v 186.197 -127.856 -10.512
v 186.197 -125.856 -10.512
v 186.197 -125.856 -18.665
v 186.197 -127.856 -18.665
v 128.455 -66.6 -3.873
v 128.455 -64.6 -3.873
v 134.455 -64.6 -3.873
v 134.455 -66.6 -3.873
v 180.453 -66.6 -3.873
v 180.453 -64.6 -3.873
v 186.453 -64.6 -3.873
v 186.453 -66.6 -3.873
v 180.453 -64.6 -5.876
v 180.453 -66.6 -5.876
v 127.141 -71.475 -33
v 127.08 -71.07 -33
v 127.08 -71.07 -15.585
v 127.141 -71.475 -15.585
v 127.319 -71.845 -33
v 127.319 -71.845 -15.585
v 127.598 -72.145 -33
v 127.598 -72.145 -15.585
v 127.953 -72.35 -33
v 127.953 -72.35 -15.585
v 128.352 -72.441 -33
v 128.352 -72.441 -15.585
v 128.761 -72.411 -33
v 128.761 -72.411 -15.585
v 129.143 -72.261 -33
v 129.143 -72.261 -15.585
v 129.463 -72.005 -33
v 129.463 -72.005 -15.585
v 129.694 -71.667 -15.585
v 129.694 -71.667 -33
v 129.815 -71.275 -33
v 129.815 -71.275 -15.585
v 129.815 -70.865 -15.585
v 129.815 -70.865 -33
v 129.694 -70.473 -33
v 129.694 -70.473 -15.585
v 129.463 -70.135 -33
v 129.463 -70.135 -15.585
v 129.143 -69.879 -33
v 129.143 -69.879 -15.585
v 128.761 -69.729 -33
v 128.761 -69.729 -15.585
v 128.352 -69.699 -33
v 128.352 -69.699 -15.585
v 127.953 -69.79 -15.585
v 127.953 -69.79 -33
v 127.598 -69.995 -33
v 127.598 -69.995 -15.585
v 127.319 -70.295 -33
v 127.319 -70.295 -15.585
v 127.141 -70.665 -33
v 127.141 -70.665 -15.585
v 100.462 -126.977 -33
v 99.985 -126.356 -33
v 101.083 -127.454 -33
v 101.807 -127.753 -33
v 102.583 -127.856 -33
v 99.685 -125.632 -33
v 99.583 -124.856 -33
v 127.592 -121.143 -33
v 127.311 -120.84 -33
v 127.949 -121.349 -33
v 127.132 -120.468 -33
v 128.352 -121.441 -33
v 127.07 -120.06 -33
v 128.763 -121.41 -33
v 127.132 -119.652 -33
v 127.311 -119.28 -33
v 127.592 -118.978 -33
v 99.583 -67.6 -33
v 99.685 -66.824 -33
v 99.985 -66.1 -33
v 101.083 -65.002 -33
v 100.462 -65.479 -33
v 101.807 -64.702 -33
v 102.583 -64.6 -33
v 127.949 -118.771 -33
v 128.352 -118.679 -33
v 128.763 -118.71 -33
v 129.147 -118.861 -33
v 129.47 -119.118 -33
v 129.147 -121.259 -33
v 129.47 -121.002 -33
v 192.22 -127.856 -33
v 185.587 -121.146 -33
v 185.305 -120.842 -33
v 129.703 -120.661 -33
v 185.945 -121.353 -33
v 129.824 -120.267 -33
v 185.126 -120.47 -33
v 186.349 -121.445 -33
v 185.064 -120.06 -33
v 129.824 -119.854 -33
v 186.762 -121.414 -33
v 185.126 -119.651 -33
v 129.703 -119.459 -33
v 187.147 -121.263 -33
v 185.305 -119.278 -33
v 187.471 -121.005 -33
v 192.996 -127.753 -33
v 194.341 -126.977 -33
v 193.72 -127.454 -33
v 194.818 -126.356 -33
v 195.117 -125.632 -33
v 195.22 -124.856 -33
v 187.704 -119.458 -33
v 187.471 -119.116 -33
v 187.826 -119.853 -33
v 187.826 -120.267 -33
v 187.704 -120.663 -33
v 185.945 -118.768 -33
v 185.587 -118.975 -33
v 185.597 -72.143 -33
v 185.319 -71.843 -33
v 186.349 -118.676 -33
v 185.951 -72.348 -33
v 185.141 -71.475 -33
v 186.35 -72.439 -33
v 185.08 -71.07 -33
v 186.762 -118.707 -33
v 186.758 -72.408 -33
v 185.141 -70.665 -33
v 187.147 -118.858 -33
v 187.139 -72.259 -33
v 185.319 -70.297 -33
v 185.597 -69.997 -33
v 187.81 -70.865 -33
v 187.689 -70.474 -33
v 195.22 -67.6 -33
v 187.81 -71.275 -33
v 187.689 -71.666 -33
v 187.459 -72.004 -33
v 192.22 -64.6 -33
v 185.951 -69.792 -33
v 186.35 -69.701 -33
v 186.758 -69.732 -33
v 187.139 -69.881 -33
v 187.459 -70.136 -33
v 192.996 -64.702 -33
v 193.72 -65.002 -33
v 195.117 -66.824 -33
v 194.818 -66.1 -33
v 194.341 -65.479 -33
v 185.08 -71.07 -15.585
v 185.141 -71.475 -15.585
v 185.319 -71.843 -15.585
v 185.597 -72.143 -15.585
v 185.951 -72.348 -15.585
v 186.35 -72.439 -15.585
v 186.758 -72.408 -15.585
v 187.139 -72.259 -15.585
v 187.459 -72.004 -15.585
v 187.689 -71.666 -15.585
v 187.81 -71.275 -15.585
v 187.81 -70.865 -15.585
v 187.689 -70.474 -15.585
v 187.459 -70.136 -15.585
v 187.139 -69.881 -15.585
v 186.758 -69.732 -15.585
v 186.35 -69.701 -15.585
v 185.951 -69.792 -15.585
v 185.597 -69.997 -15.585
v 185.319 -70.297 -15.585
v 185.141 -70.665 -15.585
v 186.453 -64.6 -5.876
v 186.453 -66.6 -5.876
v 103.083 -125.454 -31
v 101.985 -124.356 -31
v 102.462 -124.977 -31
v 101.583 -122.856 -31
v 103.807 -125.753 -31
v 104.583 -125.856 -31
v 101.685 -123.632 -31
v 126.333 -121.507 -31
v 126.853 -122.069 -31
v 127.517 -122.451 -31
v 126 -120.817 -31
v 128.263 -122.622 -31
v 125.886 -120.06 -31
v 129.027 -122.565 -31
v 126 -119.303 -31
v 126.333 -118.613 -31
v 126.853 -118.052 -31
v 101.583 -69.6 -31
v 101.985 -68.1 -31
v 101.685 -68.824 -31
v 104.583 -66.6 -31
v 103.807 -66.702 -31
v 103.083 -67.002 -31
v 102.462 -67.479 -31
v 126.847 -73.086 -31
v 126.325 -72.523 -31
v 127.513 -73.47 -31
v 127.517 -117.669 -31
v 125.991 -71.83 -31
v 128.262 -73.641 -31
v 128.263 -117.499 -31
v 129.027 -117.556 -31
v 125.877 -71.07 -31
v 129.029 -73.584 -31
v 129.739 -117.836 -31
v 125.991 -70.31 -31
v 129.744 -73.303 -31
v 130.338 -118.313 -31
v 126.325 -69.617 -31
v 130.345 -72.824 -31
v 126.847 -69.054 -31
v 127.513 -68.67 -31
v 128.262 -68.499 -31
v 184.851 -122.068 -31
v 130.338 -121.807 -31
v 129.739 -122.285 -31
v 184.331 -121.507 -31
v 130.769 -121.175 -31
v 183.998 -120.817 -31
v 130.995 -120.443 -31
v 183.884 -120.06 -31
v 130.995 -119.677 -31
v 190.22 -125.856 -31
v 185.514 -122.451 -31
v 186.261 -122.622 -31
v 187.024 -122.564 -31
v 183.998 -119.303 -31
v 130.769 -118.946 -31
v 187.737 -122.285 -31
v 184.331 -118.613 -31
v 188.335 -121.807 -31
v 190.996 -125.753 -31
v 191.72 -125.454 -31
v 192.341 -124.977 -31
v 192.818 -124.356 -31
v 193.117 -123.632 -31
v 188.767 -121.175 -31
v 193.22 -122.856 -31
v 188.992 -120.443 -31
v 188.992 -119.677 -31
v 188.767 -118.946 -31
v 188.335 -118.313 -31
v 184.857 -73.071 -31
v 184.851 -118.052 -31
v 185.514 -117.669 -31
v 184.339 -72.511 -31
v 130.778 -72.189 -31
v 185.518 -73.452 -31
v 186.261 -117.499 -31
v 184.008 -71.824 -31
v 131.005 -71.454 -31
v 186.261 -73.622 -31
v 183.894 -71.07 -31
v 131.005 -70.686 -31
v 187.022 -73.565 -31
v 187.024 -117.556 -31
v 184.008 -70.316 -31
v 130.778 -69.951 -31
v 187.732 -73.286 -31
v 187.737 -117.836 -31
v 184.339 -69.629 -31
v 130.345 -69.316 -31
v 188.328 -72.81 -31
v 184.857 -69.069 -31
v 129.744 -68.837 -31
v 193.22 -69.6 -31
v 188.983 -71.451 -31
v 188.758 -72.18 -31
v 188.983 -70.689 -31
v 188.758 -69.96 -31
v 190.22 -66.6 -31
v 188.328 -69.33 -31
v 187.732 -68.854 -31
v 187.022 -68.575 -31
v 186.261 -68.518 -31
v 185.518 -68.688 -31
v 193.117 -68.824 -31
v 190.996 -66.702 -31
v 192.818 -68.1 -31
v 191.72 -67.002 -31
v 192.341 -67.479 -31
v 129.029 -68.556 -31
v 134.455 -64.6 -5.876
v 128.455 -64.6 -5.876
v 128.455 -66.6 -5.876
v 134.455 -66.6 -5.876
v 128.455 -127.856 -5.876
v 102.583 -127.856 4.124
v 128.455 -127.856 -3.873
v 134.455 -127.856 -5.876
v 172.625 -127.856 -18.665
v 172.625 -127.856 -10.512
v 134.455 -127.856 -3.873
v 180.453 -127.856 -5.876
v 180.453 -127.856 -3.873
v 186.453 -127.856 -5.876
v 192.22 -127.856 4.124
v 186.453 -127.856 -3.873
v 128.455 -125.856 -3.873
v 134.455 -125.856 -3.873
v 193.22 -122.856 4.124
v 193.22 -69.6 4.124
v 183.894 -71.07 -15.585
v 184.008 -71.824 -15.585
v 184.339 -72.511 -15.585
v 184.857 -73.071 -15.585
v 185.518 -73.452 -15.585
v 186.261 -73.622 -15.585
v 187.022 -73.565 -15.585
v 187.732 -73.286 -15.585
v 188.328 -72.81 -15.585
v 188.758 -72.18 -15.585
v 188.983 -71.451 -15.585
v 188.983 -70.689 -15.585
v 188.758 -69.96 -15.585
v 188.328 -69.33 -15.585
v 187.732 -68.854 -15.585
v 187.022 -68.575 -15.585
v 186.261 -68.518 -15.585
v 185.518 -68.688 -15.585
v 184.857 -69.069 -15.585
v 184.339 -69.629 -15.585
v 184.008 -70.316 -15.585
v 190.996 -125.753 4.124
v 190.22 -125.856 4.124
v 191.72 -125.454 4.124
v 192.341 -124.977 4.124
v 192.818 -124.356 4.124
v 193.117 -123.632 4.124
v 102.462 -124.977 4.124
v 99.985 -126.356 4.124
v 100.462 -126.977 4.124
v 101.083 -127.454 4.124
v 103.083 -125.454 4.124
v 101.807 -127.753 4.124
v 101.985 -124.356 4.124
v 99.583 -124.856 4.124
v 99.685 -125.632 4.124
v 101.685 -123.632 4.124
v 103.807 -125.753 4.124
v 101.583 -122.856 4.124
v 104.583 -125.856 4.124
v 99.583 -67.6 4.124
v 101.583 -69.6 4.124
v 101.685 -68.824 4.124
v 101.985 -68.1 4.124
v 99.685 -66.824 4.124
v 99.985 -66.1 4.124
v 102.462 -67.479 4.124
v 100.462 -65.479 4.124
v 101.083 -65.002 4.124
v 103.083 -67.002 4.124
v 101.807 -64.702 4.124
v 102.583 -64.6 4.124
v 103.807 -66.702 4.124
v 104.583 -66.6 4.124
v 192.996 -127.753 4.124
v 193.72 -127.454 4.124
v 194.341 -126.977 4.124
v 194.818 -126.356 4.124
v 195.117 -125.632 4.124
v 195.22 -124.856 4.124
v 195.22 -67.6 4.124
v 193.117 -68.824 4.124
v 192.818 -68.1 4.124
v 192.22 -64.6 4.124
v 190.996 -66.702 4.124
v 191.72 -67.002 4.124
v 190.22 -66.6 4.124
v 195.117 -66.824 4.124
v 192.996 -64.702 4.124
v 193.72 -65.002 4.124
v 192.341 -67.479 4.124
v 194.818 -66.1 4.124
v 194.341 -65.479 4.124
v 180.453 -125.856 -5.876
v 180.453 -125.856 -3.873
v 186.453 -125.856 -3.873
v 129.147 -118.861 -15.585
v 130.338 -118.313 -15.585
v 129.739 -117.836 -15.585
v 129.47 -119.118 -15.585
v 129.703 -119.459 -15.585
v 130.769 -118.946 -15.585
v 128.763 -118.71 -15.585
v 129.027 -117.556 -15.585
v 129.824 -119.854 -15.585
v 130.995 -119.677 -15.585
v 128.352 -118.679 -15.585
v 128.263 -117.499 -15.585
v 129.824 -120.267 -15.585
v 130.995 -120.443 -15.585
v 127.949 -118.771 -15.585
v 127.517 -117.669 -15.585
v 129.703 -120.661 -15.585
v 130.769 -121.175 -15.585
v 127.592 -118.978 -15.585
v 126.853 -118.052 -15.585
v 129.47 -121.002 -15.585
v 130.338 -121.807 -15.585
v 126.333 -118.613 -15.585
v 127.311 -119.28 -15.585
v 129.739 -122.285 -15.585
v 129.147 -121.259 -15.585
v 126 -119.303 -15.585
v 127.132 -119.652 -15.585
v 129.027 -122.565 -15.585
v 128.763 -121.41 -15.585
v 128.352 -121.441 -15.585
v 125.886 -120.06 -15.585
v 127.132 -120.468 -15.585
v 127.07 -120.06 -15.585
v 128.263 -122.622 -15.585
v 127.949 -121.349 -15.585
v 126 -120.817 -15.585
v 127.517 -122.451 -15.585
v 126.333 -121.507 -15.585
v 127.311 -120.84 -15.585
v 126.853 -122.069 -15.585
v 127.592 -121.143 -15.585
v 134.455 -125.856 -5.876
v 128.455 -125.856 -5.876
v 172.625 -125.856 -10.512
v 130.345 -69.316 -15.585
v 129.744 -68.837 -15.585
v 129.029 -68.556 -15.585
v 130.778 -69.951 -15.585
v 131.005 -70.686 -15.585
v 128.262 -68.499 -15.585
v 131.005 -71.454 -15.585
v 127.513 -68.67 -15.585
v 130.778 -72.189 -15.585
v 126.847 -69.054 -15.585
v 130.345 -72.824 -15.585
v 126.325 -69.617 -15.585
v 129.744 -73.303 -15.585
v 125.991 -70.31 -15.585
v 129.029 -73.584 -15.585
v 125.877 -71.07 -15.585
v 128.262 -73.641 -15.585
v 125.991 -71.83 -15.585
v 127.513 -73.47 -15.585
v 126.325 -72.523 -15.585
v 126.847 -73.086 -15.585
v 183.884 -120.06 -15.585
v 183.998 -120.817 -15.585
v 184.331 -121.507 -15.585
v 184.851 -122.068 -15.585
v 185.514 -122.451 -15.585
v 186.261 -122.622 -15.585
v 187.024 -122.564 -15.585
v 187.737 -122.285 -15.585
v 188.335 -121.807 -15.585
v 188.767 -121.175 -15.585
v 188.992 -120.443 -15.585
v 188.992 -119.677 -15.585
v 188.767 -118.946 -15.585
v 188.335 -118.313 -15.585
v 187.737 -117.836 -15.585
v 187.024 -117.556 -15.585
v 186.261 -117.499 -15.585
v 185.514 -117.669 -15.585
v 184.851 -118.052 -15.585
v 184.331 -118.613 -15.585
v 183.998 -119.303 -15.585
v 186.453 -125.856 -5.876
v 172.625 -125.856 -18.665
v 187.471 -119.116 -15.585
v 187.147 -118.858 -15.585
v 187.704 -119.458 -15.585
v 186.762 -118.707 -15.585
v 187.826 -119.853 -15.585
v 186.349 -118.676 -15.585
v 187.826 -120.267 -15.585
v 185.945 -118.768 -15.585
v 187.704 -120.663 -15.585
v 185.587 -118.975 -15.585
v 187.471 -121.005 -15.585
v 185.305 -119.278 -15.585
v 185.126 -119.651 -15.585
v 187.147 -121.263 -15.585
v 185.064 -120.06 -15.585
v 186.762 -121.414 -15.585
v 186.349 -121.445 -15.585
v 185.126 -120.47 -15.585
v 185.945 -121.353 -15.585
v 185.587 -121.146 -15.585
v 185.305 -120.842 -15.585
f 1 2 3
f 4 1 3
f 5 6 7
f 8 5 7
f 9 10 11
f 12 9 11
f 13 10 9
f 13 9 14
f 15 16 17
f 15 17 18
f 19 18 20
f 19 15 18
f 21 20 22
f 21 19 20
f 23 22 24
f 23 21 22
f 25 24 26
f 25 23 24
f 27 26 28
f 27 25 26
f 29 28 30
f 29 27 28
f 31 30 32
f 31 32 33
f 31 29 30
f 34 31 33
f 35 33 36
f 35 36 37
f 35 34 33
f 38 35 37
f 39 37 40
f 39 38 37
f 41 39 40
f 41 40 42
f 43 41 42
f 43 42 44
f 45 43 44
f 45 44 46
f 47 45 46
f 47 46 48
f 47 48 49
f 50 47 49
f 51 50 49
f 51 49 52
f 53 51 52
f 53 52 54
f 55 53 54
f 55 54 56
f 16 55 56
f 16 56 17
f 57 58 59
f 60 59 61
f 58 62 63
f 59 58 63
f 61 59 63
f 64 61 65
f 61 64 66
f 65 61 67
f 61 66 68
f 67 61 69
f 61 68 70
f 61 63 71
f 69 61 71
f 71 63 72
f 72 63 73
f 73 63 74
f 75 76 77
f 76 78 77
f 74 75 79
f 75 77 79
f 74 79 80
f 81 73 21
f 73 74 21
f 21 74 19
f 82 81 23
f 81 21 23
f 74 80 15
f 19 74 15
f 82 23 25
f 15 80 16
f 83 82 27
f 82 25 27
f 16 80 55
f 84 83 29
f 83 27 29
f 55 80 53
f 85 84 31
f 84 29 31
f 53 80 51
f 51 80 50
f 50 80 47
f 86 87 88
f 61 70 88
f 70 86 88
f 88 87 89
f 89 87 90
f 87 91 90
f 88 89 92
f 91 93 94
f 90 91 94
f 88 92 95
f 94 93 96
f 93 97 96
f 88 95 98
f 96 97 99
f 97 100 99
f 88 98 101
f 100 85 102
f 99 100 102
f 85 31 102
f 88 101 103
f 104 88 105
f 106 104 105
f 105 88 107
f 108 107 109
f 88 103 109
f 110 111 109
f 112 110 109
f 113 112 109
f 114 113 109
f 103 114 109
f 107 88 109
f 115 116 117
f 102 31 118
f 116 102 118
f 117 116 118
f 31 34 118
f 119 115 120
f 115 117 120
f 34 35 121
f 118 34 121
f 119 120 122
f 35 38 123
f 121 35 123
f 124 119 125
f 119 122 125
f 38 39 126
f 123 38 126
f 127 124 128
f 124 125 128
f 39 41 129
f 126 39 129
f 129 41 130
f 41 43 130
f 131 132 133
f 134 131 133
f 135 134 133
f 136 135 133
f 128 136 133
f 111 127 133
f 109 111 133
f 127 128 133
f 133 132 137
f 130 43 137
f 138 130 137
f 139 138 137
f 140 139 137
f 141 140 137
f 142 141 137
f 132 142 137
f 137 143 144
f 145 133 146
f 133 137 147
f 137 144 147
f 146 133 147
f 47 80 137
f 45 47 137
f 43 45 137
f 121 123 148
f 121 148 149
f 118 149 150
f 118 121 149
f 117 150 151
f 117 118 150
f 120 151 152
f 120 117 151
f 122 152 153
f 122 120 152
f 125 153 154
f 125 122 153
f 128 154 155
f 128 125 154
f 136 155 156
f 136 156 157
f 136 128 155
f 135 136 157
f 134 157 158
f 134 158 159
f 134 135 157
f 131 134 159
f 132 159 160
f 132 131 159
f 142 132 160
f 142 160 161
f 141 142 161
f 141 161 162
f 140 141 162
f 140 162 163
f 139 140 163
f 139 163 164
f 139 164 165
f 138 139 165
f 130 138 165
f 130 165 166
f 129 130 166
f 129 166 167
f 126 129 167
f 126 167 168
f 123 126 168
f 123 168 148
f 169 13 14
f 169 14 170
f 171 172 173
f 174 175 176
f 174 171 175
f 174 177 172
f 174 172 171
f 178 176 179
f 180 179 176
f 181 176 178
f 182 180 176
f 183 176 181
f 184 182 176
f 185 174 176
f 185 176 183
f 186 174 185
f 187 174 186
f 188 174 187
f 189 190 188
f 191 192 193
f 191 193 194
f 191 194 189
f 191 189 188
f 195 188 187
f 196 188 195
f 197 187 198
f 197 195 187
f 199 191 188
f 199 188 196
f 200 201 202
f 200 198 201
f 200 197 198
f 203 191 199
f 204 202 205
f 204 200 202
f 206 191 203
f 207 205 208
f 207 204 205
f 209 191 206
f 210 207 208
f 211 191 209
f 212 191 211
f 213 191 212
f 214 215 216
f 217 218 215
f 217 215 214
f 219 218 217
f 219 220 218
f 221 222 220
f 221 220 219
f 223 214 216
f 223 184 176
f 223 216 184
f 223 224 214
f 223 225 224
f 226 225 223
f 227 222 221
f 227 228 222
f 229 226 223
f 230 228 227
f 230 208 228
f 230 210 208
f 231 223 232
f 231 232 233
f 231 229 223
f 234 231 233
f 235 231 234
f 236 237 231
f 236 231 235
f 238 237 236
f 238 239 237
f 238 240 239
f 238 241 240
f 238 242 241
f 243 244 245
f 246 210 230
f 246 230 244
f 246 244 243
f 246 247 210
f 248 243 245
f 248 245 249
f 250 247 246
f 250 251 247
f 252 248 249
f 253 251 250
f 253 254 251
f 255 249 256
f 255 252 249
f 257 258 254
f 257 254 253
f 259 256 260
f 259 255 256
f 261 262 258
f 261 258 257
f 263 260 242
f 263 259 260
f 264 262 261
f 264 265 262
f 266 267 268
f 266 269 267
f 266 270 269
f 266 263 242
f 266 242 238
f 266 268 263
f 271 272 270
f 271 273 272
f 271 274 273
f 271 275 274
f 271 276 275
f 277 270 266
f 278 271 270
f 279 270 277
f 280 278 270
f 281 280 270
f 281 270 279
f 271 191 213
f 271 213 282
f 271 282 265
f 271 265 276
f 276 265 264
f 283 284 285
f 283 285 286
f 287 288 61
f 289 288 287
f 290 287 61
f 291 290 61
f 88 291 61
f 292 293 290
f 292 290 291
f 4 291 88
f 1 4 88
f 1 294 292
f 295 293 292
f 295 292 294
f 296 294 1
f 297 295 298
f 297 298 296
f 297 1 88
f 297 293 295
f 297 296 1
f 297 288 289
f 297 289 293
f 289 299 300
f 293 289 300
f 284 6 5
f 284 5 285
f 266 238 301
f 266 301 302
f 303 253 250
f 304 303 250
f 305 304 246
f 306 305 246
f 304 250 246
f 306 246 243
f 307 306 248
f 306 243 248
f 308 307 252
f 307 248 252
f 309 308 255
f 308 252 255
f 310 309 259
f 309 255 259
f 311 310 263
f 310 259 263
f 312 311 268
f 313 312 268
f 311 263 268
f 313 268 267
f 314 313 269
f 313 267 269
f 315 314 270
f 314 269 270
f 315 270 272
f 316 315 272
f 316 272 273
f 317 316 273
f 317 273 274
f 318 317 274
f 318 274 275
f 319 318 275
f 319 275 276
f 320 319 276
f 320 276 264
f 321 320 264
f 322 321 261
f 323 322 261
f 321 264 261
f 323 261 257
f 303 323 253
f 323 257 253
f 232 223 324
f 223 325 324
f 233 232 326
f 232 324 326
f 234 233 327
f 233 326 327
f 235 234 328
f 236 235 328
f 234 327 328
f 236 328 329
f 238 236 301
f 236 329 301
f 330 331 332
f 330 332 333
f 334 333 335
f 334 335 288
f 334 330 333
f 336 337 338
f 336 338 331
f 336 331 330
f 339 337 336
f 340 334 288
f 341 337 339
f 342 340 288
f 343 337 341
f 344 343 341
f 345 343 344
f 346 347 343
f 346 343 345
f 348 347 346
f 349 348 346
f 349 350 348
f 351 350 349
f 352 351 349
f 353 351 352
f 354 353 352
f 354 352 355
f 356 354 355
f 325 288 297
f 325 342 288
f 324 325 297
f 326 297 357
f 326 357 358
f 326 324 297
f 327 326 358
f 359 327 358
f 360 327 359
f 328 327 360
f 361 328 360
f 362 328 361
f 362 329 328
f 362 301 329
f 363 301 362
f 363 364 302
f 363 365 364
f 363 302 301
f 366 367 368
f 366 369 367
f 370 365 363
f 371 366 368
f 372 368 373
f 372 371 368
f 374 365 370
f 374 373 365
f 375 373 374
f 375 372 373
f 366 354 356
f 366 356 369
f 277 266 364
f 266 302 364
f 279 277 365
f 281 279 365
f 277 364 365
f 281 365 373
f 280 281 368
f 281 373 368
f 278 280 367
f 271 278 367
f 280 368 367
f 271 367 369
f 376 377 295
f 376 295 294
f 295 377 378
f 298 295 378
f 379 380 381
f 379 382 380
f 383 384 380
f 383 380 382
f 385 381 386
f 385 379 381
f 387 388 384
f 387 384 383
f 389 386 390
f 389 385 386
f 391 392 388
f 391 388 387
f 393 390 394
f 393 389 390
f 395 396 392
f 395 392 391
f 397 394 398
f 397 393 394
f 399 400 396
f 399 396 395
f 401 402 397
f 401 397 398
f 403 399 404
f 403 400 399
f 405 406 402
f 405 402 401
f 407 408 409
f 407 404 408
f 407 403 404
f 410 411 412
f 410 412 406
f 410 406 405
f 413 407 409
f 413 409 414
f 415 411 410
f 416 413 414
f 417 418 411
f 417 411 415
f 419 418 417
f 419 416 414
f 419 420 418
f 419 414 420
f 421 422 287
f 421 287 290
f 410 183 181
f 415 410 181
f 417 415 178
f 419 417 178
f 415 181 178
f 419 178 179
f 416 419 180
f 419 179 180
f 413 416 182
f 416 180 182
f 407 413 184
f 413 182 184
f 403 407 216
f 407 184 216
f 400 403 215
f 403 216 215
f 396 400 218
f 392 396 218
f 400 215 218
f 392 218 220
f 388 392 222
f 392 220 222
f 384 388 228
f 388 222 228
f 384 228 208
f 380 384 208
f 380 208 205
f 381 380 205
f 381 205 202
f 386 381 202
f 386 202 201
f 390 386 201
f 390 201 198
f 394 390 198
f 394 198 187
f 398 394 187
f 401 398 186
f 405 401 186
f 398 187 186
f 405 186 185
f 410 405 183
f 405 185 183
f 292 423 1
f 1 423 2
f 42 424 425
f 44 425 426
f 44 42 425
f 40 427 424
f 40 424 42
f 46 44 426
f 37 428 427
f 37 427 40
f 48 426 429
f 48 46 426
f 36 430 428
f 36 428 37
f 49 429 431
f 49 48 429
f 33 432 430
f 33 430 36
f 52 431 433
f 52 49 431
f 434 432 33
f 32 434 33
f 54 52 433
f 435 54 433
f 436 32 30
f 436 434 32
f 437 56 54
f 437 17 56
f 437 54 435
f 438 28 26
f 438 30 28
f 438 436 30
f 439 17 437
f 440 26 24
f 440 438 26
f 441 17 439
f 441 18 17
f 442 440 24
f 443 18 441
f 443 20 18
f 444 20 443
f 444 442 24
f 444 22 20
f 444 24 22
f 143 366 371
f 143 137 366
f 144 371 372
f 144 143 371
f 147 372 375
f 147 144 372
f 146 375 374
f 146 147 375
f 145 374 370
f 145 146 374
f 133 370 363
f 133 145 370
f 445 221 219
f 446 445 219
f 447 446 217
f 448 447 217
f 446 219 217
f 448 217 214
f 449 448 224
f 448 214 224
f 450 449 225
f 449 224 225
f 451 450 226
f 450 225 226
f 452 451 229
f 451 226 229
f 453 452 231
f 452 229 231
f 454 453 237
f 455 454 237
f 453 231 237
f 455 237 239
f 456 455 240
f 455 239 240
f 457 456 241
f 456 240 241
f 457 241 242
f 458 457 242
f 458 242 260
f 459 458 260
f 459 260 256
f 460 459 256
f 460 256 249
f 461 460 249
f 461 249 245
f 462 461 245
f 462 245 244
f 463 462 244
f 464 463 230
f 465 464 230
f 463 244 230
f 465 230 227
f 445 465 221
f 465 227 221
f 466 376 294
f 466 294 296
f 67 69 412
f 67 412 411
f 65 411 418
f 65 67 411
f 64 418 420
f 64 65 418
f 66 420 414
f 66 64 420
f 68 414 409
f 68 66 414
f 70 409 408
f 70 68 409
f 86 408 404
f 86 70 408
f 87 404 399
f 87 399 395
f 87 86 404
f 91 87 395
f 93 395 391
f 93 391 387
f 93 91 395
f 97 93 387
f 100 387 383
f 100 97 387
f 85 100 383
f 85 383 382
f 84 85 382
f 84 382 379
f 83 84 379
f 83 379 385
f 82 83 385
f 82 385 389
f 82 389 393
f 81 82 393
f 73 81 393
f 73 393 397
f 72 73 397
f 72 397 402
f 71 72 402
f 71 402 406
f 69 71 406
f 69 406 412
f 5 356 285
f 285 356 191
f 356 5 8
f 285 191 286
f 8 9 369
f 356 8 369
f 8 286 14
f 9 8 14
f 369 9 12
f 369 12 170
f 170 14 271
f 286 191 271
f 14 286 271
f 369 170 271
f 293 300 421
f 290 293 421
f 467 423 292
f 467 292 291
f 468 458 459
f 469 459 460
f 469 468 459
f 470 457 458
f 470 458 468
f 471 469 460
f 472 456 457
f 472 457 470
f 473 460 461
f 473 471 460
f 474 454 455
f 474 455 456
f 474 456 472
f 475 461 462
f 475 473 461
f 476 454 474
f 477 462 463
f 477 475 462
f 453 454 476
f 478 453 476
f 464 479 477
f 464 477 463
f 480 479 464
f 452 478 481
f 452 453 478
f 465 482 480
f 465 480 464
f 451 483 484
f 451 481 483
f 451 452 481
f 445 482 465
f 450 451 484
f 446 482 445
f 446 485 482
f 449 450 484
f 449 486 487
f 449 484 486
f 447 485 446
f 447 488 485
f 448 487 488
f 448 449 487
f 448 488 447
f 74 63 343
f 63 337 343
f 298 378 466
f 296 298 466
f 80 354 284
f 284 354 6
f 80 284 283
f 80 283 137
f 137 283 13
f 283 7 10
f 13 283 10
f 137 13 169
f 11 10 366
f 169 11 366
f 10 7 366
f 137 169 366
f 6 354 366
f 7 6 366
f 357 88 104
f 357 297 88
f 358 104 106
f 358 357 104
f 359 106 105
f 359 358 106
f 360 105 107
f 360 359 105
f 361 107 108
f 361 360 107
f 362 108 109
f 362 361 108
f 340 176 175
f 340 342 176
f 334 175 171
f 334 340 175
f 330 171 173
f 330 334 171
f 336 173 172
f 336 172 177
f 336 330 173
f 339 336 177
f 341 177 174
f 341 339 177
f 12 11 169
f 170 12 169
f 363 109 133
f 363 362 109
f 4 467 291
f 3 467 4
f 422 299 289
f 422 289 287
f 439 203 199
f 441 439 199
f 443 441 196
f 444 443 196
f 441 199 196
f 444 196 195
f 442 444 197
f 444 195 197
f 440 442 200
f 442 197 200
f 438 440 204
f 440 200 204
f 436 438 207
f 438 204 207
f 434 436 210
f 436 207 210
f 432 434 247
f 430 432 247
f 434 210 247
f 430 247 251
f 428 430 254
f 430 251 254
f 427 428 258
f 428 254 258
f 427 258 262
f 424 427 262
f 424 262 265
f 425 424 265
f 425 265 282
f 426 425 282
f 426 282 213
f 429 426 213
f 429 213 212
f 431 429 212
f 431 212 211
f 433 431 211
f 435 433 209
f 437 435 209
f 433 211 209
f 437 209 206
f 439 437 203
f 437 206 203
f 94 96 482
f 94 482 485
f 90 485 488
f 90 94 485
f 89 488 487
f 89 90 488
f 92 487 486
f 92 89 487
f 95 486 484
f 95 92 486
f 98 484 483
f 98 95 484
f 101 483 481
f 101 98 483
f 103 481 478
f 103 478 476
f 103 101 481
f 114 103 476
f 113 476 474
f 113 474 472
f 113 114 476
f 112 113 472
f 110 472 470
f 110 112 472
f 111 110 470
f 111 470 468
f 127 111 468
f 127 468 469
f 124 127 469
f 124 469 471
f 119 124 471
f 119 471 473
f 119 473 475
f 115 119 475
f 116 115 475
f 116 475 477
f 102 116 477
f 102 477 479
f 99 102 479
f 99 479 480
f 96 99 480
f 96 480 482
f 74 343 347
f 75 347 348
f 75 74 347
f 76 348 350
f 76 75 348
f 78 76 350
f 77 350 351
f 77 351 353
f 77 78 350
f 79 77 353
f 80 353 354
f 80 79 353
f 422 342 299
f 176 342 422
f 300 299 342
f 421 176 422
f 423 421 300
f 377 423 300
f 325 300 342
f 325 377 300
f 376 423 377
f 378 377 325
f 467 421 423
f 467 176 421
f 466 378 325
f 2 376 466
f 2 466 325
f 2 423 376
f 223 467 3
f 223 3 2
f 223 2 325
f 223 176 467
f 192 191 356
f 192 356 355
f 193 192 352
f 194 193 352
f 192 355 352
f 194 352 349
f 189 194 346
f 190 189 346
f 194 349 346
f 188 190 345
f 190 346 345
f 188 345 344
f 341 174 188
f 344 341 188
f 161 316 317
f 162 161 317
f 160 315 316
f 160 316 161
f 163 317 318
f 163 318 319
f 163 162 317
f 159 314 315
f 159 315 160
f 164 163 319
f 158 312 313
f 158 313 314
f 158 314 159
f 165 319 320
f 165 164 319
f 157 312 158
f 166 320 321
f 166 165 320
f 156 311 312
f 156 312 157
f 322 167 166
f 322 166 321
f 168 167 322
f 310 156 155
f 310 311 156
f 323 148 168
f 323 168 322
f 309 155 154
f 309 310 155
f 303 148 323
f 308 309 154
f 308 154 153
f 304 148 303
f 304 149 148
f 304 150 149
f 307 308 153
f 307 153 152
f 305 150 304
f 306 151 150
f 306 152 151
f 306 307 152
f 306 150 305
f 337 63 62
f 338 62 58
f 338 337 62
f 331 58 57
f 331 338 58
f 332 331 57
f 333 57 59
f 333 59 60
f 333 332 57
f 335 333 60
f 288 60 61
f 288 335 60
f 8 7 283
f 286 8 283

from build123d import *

# Parameters (mm, degrees)
PERIMETER_DEPTH      = 4.124453
PERIMETER_DEPTH_BACK = 31
SKETCH2_W            = 95.636537696
SKETCH2_H            = 63.255720718
SKETCH2_W_2          = 91.636537696
SKETCH2_H_2          = 59.255720718
USB_HOLE_START       = -66.6
SKETCH4_W            = 13.571838798
SKETCH4_H            = 8.15289322
USB_HOLE_DEPTH       = 81
BOTTOM_START         = -31
SKETCH2_12_W         = 95.636537696
SKETCH2_12_H         = 63.255720718
BOTTOM_DEPTH         = 2
SKETCH4_6_W          = 6
SKETCH4_6_H          = 2.002355377
LOCKING_HOLE_DEPTH   = 152
FILLET1_R            = 3
STRAWS_START         = -31
SKETCH2_14_R         = 2.578463196
SKETCH2_14_R_2       = 1.375
SKETCH2_14_R_3       = 2.558752615
SKETCH2_14_R_4       = 1.372691975
SKETCH2_14_R_5       = 2.568645486
SKETCH2_14_R_6       = 1.384737696
SKETCH2_14_R_7       = 2.568443666
SKETCH2_14_R_8       = 1.388555099
STRAWS_DEPTH         = 15.415068015
CUT_EXTRUDE3_START   = -68
SKETCH2_16_R         = 1.375
SKETCH2_16_R_2       = 1.388555099
SKETCH2_16_R_3       = 1.384737696
SKETCH2_16_R_4       = 1.372691975
CUT_EXTRUDE3_DEPTH   = 68


with BuildPart() as part:
    # Sketch2 → Perimeter (new, two sides: drawn at the far end of the back side and taken through both)
    with BuildSketch(Plane.XY.offset(-PERIMETER_DEPTH_BACK)):
        with Locations((147.401306837, -96.227860359)):
            Rectangle(SKETCH2_W, SKETCH2_H)
        with Locations((147.401306837, -96.227860359)):
            Rectangle(SKETCH2_W_2, SKETCH2_H_2, mode=Mode.SUBTRACT)
    extrude(amount=PERIMETER_DEPTH + PERIMETER_DEPTH_BACK)

    # Sketch4 → USB_Hole (cut)
    with BuildSketch(Plane(origin=(0, 0, 0), x_dir=(1, 0, 0), z_dir=(0, 1, 0)).offset(USB_HOLE_START)):
        with Locations((179.410729964, 14.588485375)):
            Rectangle(SKETCH4_W, SKETCH4_H)
    extrude(amount=-USB_HOLE_DEPTH, mode=Mode.SUBTRACT)

    # Sketch2<12> → Bottom (add)
    with BuildSketch(Plane.XY.offset(BOTTOM_START)):
        with Locations((147.401306837, -96.227860359)):
            Rectangle(SKETCH2_12_W, SKETCH2_12_H)
    extrude(amount=-BOTTOM_DEPTH)

    # Sketch4<6> → Locking_Hole (cut)
    with BuildSketch(Plane(origin=(0, 0, 0), x_dir=(1, 0, 0), z_dir=(0, 1, 0))):
        with Locations((131.455, 4.874369651)):
            Rectangle(SKETCH4_6_W, SKETCH4_6_H)
        with Locations((183.452691975, 4.874369651)):
            Rectangle(SKETCH4_6_W, SKETCH4_6_H)
    extrude(amount=-LOCKING_HOLE_DEPTH, mode=Mode.SUBTRACT)

    # Fillet1
    fillet1_edges = [part.edges().sort_by_distance(p)[0] for p in [
        (101.583037989, -125.855720718, -13.4377735),
        (101.583037989, -66.6, -13.4377735),
        (193.219575685, -66.6, -13.4377735),
        (195.219575685, -64.6, -14.4377735),
        (193.219575685, -125.855720718, -13.4377735),
        (195.219575685, -127.855720718, -14.4377735),
        (99.583037989, -64.6, -14.4377735),
        (99.583037989, -127.855720718, -14.4377735),
    ]]
    fillet(fillet1_edges, radius=FILLET1_R)

    # Sketch2<14> → Straws (add)
    # profile 1 of 4: a face of its own
    with BuildSketch(Plane.XY.offset(STRAWS_START)):
        with Locations(Location((128.455, -71.07, 0), (0, 0, 180))):
            Circle(SKETCH2_14_R)
        with Locations(Location((128.455, -71.07, 0), (0, 0, 180))):
            Circle(SKETCH2_14_R_2, mode=Mode.SUBTRACT)
    # profile 2 of 4: a face of its own
    with BuildSketch(Plane.XY.offset(STRAWS_START)):
        with Locations(Location((186.452691975, -71.07, 0), (0, 0, 180))):
            Circle(SKETCH2_14_R_3)
        with Locations(Location((186.452691975, -71.07, 0), (0, 0, 180))):
            Circle(SKETCH2_14_R_4, mode=Mode.SUBTRACT)
    # profile 3 of 4: a face of its own
    with BuildSketch(Plane.XY.offset(STRAWS_START)):
        with Locations(Location((128.455, -120.060262304, 0), (0, 0, 180))):
            Circle(SKETCH2_14_R_5)
        with Locations(Location((128.455, -120.060262304, 0), (0, 0, 180))):
            Circle(SKETCH2_14_R_6, mode=Mode.SUBTRACT)
    # profile 4 of 4: a face of its own
    with BuildSketch(Plane.XY.offset(STRAWS_START)):
        with Locations(Location((186.452691975, -120.060262304, 0), (0, 0, 180))):
            Circle(SKETCH2_14_R_7)
        with Locations(Location((186.452691975, -120.060262304, 0), (0, 0, 180))):
            Circle(SKETCH2_14_R_8, mode=Mode.SUBTRACT)
    extrude(amount=STRAWS_DEPTH)

    # Sketch2<16> → Cut-Extrude3 (cut)
    with BuildSketch(Plane.XY.offset(CUT_EXTRUDE3_START)):
        with Locations(Location((128.455, -71.07, 0), (0, 0, 180))):
            Circle(SKETCH2_16_R)
        with Locations(Location((186.452691975, -120.060262304, 0), (0, 0, 180))):
            Circle(SKETCH2_16_R_2)
        with Locations(Location((128.455, -120.060262304, 0), (0, 0, 180))):
            Circle(SKETCH2_16_R_3)
        with Locations(Location((186.452691975, -71.07, 0), (0, 0, 180))):
            Circle(SKETCH2_16_R_4)
    extrude(amount=CUT_EXTRUDE3_DEPTH, mode=Mode.SUBTRACT)


solid = part.part
